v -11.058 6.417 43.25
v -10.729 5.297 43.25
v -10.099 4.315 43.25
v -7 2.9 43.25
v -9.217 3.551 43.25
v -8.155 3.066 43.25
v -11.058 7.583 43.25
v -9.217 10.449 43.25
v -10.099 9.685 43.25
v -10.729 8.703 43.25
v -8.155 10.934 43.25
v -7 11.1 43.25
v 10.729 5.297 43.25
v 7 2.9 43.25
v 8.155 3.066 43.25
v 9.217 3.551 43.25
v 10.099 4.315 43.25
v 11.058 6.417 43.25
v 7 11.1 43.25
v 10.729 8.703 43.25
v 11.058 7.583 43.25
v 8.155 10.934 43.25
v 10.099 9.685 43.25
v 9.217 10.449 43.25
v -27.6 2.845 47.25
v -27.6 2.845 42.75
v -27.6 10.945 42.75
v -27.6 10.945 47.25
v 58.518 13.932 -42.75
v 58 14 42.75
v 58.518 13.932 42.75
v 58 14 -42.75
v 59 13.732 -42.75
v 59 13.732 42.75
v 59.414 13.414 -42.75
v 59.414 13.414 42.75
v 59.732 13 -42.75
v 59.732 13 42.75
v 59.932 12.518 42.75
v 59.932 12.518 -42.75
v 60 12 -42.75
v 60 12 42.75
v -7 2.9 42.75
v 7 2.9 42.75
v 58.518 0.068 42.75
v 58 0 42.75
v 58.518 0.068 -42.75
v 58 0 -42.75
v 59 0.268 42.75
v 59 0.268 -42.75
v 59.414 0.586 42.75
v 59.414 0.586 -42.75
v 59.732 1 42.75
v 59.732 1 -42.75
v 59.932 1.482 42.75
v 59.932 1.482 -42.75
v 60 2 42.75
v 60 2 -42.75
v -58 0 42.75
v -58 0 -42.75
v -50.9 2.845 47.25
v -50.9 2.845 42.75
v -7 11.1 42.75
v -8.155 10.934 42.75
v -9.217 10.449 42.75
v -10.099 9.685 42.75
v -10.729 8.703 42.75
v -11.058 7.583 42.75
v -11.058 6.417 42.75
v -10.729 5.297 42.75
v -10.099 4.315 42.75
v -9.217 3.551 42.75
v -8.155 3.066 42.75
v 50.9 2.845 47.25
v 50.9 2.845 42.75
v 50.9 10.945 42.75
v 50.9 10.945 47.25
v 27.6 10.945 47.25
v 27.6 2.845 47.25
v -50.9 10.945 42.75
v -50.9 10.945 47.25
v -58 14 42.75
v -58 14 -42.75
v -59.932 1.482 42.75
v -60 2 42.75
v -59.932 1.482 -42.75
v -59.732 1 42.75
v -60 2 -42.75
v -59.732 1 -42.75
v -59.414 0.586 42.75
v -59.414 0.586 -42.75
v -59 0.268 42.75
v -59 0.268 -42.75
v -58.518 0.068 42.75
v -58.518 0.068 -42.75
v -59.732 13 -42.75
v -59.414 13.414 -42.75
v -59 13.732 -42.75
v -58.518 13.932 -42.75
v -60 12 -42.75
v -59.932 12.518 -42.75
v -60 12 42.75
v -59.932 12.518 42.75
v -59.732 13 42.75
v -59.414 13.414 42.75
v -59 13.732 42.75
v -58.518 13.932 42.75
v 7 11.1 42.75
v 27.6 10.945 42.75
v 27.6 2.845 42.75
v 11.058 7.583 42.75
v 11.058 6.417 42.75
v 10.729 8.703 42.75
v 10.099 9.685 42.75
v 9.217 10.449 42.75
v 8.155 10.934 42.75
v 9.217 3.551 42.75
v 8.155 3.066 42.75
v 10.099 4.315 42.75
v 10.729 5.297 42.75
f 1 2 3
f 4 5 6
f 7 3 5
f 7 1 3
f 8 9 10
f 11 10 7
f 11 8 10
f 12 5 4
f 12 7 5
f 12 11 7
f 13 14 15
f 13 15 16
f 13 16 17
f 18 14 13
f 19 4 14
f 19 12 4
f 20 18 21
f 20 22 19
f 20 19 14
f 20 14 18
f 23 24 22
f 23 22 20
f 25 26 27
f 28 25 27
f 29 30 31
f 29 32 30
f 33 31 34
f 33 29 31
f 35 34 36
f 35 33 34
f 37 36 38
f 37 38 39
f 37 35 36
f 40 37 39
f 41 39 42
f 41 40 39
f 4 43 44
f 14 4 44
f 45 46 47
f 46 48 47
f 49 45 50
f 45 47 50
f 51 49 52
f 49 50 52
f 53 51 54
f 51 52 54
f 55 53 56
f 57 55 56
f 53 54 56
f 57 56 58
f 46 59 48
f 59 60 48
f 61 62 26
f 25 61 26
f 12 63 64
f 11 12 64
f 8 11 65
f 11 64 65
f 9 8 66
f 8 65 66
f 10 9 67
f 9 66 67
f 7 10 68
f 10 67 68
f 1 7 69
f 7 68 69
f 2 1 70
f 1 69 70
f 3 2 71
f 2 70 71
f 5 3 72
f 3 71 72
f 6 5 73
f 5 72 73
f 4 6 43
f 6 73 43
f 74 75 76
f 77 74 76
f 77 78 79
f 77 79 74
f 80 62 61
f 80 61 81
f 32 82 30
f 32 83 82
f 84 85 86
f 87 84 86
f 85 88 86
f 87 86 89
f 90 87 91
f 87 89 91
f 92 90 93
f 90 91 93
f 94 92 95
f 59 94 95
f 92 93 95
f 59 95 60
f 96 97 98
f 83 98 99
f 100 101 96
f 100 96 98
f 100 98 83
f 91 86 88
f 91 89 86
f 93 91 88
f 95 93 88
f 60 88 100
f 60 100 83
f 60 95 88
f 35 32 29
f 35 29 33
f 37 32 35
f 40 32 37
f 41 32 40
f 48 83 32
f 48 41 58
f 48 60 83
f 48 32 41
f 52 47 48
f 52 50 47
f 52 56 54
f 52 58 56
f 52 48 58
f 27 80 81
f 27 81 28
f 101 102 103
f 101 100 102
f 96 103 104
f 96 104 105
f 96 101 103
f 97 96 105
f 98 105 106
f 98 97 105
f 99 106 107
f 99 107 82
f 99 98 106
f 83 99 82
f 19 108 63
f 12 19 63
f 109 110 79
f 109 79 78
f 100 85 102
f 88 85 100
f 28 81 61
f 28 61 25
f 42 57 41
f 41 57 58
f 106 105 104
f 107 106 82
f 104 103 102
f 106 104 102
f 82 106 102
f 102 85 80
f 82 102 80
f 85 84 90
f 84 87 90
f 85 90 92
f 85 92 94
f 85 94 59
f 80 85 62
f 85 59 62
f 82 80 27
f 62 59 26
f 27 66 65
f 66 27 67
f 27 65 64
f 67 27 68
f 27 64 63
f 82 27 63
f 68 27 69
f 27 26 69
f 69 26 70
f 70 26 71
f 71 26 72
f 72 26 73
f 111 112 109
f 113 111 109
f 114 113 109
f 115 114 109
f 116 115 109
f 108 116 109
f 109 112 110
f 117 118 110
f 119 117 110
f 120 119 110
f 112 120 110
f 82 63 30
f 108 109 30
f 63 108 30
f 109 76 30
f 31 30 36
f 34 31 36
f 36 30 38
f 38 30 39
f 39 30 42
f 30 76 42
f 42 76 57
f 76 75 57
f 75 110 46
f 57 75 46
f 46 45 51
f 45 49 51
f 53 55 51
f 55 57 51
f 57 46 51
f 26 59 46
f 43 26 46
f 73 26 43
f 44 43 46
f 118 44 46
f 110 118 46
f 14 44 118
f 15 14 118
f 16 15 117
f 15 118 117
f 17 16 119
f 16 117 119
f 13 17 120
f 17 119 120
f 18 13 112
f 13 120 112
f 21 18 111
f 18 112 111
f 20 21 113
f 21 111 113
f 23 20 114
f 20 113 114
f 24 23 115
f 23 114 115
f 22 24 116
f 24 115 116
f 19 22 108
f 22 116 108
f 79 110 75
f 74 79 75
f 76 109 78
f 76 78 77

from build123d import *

# Parameters (mm, degrees)
SKETCH1_W           = 120
SKETCH1_H           = 85.5
BOSS_EXTRUDE1_DEPTH = 14
SKETCH2_W           = 23.3
SKETCH2_H           = 8.1
BOSS_EXTRUDE2_DEPTH = 4.5
FILLET2_R           = 2
BOSS_EXTRUDE3_DEPTH = 0.5


with BuildPart() as part:
    # Sketch1 → Boss-Extrude1 (new body)
    with BuildSketch(Plane(origin=(0, 0, 0), x_dir=(1, 0, 0), z_dir=(0, 1, 0))):
        Rectangle(SKETCH1_W, SKETCH1_H)
    extrude(amount=BOSS_EXTRUDE1_DEPTH)

    # Sketch2 → Boss-Extrude2 (add)
    with BuildSketch(Plane.XY.offset(42.75)):
        with Locations((-39.25, 6.894561701)):
            Rectangle(SKETCH2_W, SKETCH2_H)
        with Locations((39.25, 6.894561701)):
            Rectangle(SKETCH2_W, SKETCH2_H)
    extrude(amount=BOSS_EXTRUDE2_DEPTH)

    # Fillet2
    fillet2_edges = [part.edges().sort_by_distance(p)[0] for p in [
        (-60, 14, 0),
        (60, 14, 0),
        (-60, 0, 0),
        (60, 0, 0),
    ]]
    fillet(fillet2_edges, radius=FILLET2_R)

    # Sketch4 → Boss-Extrude3 (add)
    with BuildSketch(Plane.XY.offset(42.75)):
        with BuildLine():
            Line((-7, 2.9), (7, 2.9))
            ThreePointArc((7, 2.9), (11.1, 7), (7, 11.1))
            Line((7, 11.1), (-7, 11.1))
            ThreePointArc((-7, 11.1), (-11.1, 7), (-7, 2.9))
        make_face()
    extrude(amount=BOSS_EXTRUDE3_DEPTH)


solid = part.part
